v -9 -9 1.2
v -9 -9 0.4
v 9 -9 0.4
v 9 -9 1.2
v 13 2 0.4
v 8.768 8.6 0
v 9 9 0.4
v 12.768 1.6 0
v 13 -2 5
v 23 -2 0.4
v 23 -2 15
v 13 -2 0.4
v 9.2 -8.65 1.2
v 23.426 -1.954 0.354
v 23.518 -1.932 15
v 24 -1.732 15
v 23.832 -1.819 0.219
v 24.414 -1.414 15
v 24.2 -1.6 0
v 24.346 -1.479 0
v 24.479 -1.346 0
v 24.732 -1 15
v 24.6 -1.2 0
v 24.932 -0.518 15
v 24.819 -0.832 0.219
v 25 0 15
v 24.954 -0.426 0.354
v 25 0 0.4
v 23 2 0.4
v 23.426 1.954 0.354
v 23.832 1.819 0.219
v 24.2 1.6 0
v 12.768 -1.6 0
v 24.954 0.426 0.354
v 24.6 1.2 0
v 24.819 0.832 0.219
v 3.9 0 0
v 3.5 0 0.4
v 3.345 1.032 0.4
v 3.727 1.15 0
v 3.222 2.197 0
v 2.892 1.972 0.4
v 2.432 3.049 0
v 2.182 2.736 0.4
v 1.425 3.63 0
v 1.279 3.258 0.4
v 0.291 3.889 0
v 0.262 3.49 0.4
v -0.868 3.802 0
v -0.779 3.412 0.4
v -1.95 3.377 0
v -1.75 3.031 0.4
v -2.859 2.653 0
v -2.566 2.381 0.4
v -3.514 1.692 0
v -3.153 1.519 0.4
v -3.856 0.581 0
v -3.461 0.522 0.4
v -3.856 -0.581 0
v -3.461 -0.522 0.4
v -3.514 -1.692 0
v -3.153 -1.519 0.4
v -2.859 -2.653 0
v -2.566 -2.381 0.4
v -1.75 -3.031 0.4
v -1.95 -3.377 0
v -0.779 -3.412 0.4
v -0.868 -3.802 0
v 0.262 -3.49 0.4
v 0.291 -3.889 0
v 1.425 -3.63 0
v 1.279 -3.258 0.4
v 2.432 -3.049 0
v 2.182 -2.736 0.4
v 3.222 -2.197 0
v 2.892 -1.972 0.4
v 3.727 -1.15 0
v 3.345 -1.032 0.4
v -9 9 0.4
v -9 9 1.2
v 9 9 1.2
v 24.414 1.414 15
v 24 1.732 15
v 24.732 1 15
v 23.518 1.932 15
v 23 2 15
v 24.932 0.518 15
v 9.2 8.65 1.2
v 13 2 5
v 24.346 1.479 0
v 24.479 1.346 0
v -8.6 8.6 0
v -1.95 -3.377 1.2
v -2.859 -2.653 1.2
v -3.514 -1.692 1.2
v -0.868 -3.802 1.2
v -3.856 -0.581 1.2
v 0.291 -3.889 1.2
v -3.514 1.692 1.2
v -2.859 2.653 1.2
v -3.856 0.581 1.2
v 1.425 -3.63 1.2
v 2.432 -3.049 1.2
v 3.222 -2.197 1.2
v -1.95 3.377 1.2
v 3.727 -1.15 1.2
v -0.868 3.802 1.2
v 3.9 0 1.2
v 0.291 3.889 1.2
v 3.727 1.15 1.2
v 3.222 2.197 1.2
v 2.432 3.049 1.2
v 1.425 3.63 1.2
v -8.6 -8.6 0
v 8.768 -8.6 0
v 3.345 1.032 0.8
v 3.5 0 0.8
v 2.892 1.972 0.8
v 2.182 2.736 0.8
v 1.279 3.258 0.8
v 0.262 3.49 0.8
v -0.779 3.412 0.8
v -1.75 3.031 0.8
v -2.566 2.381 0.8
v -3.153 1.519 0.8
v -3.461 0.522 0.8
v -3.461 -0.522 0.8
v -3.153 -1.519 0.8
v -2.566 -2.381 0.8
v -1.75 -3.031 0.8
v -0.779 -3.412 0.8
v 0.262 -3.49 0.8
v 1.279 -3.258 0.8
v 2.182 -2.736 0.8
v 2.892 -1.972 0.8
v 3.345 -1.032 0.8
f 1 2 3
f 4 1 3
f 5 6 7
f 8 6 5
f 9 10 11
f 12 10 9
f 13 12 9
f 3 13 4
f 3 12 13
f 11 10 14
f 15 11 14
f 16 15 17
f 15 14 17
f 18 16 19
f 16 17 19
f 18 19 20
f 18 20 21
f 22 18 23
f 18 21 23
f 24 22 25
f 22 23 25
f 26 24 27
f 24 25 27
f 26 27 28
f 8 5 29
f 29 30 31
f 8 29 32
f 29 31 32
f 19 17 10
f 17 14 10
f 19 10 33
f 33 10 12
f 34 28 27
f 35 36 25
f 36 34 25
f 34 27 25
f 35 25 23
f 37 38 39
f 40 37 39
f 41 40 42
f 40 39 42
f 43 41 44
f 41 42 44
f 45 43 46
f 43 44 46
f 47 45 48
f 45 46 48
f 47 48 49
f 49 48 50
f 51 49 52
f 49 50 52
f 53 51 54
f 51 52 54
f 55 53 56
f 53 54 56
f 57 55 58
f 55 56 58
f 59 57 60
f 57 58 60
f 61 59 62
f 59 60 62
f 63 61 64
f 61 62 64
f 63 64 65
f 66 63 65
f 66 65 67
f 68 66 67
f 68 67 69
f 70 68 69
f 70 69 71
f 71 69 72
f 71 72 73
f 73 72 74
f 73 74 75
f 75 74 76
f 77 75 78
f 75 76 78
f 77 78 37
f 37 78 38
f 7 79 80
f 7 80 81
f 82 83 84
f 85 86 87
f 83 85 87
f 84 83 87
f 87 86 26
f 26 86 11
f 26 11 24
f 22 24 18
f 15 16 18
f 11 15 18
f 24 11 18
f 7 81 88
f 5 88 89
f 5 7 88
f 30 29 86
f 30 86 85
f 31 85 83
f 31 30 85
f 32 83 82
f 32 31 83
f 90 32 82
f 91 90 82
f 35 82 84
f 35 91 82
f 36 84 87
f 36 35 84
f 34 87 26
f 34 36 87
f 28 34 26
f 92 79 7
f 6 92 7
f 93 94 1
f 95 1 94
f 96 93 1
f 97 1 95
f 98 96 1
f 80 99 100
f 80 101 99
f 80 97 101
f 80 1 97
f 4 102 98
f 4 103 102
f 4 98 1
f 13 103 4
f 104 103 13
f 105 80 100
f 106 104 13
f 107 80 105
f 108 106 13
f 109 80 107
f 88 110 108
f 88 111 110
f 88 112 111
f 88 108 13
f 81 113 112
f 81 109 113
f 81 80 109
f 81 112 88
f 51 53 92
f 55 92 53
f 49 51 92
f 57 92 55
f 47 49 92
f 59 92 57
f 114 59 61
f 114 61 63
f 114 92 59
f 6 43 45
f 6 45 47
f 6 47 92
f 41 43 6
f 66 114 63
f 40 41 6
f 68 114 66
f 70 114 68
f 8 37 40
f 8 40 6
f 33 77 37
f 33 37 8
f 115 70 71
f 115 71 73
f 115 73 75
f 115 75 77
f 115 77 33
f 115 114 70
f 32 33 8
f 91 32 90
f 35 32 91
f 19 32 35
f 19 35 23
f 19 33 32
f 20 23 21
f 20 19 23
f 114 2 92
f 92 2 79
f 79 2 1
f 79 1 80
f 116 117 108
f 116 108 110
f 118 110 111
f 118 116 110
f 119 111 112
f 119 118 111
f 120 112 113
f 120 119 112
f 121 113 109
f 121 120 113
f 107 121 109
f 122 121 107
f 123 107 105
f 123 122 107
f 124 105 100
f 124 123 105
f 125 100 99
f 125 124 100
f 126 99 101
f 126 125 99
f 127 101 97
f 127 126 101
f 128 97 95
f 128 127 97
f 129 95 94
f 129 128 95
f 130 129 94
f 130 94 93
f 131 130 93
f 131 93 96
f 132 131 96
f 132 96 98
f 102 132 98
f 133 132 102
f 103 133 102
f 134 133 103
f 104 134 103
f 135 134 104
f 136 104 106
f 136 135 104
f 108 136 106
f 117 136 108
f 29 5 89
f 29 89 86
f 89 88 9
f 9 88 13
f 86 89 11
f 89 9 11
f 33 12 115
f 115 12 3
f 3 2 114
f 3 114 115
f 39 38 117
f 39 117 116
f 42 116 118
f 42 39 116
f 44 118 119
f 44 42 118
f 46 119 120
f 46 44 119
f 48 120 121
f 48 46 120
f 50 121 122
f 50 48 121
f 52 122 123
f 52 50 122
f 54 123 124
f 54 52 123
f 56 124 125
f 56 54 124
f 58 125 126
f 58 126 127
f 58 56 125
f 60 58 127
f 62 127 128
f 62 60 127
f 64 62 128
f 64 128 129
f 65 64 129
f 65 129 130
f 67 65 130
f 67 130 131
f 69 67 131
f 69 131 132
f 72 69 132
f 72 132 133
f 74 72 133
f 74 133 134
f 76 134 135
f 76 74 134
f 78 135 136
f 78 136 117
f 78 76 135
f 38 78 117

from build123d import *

# Parameters (mm, degrees)
F0_W        = 18
F0_H        = 18
F0_R        = 3.5
F1_DEPTH    = 1.2
F3_DEPTH    = 15
F4_T4_DEPTH = 90.007123663
F5_SIZE     = 0.4
F6_T1_DEPTH = 24.6


# Not quite as in the source:
# - a fillet or chamfer that OpenCascade refuses, or shapes differently, is made with other operations: its cross-section is extruded or revolved along the edge and cut away or added


with BuildPart() as f1:
    # F0 (on Top) → F1 (new body)
    with BuildSketch(Plane.XY):
        Rectangle(F0_W, F0_H)
        Circle(F0_R, mode=Mode.SUBTRACT)
    extrude(amount=F1_DEPTH)

    # F2 (on face) → F3 (join)
    with BuildSketch(Plane(origin=(0, 0, 0), x_dir=(1, 0, 0), z_dir=(0, 0, -1))):
        Polygon((9, 0), (9, -9), (13, -2), (25, -2), (25, 0), align=None)
        Polygon((9, 9), (9, 0), (25, 0), (25, 2), (13, 2), align=None)
    extrude(amount=-F3_DEPTH)

    # F4: chamfer of 14 on 1 edges, made by hand


with BuildPart() as f4_tool2:
    # F4_s3 → F4_t4 (new body)
    with BuildSketch(Plane.XZ.offset(45.0035618315)):
        Polygon((9, 1), (23, 15), (9, 15), align=None)
    extrude(amount=-F4_T4_DEPTH)

    split(bisect_by=Plane.XY.offset(1.2), keep=Keep.TOP)


with BuildPart() as f1_1:
    add(f1.part)

    # F4_t1: cut F4_tool2
    add(f4_tool2.part, mode=Mode.SUBTRACT)

    # F5
    f5_edges = [f1_1.edges().sort_by_distance(p)[0] for p in [
        (0, -9, 0),
        (11, -5.5, 0),
        (19, -2, 0),
        (25, 0, 0),
        (19, 2, 0),
        (11, 5.5, 0),
        (0, 9, 0),
        (-9, 0, 0),
        (-3.5, 0, 0),
        (-3.5, 0, 1.2),
    ]]
    chamfer(f5_edges, length=F5_SIZE)

    # F6: fillet of radius 2 on 2 edges, made by hand

    # F6_s2 → F6_t1 (cut)
    with BuildSketch(Plane.XY.offset(-4.6)):
        with BuildLine():
            ThreePointArc((23, -2), (24.4142135624, -1.4142135624), (25, 0))
            Line((25, 0), (25, -2))
            Line((25, -2), (23, -2))
        make_face()
        with BuildLine():
            ThreePointArc((23, 2), (24.4142135624, 1.4142135624), (25, 0))
            Line((25, 0), (25, 2))
            Line((25, 2), (23, 2))
        make_face()
    extrude(amount=F6_T1_DEPTH, mode=Mode.SUBTRACT)


solid = f1_1.part
